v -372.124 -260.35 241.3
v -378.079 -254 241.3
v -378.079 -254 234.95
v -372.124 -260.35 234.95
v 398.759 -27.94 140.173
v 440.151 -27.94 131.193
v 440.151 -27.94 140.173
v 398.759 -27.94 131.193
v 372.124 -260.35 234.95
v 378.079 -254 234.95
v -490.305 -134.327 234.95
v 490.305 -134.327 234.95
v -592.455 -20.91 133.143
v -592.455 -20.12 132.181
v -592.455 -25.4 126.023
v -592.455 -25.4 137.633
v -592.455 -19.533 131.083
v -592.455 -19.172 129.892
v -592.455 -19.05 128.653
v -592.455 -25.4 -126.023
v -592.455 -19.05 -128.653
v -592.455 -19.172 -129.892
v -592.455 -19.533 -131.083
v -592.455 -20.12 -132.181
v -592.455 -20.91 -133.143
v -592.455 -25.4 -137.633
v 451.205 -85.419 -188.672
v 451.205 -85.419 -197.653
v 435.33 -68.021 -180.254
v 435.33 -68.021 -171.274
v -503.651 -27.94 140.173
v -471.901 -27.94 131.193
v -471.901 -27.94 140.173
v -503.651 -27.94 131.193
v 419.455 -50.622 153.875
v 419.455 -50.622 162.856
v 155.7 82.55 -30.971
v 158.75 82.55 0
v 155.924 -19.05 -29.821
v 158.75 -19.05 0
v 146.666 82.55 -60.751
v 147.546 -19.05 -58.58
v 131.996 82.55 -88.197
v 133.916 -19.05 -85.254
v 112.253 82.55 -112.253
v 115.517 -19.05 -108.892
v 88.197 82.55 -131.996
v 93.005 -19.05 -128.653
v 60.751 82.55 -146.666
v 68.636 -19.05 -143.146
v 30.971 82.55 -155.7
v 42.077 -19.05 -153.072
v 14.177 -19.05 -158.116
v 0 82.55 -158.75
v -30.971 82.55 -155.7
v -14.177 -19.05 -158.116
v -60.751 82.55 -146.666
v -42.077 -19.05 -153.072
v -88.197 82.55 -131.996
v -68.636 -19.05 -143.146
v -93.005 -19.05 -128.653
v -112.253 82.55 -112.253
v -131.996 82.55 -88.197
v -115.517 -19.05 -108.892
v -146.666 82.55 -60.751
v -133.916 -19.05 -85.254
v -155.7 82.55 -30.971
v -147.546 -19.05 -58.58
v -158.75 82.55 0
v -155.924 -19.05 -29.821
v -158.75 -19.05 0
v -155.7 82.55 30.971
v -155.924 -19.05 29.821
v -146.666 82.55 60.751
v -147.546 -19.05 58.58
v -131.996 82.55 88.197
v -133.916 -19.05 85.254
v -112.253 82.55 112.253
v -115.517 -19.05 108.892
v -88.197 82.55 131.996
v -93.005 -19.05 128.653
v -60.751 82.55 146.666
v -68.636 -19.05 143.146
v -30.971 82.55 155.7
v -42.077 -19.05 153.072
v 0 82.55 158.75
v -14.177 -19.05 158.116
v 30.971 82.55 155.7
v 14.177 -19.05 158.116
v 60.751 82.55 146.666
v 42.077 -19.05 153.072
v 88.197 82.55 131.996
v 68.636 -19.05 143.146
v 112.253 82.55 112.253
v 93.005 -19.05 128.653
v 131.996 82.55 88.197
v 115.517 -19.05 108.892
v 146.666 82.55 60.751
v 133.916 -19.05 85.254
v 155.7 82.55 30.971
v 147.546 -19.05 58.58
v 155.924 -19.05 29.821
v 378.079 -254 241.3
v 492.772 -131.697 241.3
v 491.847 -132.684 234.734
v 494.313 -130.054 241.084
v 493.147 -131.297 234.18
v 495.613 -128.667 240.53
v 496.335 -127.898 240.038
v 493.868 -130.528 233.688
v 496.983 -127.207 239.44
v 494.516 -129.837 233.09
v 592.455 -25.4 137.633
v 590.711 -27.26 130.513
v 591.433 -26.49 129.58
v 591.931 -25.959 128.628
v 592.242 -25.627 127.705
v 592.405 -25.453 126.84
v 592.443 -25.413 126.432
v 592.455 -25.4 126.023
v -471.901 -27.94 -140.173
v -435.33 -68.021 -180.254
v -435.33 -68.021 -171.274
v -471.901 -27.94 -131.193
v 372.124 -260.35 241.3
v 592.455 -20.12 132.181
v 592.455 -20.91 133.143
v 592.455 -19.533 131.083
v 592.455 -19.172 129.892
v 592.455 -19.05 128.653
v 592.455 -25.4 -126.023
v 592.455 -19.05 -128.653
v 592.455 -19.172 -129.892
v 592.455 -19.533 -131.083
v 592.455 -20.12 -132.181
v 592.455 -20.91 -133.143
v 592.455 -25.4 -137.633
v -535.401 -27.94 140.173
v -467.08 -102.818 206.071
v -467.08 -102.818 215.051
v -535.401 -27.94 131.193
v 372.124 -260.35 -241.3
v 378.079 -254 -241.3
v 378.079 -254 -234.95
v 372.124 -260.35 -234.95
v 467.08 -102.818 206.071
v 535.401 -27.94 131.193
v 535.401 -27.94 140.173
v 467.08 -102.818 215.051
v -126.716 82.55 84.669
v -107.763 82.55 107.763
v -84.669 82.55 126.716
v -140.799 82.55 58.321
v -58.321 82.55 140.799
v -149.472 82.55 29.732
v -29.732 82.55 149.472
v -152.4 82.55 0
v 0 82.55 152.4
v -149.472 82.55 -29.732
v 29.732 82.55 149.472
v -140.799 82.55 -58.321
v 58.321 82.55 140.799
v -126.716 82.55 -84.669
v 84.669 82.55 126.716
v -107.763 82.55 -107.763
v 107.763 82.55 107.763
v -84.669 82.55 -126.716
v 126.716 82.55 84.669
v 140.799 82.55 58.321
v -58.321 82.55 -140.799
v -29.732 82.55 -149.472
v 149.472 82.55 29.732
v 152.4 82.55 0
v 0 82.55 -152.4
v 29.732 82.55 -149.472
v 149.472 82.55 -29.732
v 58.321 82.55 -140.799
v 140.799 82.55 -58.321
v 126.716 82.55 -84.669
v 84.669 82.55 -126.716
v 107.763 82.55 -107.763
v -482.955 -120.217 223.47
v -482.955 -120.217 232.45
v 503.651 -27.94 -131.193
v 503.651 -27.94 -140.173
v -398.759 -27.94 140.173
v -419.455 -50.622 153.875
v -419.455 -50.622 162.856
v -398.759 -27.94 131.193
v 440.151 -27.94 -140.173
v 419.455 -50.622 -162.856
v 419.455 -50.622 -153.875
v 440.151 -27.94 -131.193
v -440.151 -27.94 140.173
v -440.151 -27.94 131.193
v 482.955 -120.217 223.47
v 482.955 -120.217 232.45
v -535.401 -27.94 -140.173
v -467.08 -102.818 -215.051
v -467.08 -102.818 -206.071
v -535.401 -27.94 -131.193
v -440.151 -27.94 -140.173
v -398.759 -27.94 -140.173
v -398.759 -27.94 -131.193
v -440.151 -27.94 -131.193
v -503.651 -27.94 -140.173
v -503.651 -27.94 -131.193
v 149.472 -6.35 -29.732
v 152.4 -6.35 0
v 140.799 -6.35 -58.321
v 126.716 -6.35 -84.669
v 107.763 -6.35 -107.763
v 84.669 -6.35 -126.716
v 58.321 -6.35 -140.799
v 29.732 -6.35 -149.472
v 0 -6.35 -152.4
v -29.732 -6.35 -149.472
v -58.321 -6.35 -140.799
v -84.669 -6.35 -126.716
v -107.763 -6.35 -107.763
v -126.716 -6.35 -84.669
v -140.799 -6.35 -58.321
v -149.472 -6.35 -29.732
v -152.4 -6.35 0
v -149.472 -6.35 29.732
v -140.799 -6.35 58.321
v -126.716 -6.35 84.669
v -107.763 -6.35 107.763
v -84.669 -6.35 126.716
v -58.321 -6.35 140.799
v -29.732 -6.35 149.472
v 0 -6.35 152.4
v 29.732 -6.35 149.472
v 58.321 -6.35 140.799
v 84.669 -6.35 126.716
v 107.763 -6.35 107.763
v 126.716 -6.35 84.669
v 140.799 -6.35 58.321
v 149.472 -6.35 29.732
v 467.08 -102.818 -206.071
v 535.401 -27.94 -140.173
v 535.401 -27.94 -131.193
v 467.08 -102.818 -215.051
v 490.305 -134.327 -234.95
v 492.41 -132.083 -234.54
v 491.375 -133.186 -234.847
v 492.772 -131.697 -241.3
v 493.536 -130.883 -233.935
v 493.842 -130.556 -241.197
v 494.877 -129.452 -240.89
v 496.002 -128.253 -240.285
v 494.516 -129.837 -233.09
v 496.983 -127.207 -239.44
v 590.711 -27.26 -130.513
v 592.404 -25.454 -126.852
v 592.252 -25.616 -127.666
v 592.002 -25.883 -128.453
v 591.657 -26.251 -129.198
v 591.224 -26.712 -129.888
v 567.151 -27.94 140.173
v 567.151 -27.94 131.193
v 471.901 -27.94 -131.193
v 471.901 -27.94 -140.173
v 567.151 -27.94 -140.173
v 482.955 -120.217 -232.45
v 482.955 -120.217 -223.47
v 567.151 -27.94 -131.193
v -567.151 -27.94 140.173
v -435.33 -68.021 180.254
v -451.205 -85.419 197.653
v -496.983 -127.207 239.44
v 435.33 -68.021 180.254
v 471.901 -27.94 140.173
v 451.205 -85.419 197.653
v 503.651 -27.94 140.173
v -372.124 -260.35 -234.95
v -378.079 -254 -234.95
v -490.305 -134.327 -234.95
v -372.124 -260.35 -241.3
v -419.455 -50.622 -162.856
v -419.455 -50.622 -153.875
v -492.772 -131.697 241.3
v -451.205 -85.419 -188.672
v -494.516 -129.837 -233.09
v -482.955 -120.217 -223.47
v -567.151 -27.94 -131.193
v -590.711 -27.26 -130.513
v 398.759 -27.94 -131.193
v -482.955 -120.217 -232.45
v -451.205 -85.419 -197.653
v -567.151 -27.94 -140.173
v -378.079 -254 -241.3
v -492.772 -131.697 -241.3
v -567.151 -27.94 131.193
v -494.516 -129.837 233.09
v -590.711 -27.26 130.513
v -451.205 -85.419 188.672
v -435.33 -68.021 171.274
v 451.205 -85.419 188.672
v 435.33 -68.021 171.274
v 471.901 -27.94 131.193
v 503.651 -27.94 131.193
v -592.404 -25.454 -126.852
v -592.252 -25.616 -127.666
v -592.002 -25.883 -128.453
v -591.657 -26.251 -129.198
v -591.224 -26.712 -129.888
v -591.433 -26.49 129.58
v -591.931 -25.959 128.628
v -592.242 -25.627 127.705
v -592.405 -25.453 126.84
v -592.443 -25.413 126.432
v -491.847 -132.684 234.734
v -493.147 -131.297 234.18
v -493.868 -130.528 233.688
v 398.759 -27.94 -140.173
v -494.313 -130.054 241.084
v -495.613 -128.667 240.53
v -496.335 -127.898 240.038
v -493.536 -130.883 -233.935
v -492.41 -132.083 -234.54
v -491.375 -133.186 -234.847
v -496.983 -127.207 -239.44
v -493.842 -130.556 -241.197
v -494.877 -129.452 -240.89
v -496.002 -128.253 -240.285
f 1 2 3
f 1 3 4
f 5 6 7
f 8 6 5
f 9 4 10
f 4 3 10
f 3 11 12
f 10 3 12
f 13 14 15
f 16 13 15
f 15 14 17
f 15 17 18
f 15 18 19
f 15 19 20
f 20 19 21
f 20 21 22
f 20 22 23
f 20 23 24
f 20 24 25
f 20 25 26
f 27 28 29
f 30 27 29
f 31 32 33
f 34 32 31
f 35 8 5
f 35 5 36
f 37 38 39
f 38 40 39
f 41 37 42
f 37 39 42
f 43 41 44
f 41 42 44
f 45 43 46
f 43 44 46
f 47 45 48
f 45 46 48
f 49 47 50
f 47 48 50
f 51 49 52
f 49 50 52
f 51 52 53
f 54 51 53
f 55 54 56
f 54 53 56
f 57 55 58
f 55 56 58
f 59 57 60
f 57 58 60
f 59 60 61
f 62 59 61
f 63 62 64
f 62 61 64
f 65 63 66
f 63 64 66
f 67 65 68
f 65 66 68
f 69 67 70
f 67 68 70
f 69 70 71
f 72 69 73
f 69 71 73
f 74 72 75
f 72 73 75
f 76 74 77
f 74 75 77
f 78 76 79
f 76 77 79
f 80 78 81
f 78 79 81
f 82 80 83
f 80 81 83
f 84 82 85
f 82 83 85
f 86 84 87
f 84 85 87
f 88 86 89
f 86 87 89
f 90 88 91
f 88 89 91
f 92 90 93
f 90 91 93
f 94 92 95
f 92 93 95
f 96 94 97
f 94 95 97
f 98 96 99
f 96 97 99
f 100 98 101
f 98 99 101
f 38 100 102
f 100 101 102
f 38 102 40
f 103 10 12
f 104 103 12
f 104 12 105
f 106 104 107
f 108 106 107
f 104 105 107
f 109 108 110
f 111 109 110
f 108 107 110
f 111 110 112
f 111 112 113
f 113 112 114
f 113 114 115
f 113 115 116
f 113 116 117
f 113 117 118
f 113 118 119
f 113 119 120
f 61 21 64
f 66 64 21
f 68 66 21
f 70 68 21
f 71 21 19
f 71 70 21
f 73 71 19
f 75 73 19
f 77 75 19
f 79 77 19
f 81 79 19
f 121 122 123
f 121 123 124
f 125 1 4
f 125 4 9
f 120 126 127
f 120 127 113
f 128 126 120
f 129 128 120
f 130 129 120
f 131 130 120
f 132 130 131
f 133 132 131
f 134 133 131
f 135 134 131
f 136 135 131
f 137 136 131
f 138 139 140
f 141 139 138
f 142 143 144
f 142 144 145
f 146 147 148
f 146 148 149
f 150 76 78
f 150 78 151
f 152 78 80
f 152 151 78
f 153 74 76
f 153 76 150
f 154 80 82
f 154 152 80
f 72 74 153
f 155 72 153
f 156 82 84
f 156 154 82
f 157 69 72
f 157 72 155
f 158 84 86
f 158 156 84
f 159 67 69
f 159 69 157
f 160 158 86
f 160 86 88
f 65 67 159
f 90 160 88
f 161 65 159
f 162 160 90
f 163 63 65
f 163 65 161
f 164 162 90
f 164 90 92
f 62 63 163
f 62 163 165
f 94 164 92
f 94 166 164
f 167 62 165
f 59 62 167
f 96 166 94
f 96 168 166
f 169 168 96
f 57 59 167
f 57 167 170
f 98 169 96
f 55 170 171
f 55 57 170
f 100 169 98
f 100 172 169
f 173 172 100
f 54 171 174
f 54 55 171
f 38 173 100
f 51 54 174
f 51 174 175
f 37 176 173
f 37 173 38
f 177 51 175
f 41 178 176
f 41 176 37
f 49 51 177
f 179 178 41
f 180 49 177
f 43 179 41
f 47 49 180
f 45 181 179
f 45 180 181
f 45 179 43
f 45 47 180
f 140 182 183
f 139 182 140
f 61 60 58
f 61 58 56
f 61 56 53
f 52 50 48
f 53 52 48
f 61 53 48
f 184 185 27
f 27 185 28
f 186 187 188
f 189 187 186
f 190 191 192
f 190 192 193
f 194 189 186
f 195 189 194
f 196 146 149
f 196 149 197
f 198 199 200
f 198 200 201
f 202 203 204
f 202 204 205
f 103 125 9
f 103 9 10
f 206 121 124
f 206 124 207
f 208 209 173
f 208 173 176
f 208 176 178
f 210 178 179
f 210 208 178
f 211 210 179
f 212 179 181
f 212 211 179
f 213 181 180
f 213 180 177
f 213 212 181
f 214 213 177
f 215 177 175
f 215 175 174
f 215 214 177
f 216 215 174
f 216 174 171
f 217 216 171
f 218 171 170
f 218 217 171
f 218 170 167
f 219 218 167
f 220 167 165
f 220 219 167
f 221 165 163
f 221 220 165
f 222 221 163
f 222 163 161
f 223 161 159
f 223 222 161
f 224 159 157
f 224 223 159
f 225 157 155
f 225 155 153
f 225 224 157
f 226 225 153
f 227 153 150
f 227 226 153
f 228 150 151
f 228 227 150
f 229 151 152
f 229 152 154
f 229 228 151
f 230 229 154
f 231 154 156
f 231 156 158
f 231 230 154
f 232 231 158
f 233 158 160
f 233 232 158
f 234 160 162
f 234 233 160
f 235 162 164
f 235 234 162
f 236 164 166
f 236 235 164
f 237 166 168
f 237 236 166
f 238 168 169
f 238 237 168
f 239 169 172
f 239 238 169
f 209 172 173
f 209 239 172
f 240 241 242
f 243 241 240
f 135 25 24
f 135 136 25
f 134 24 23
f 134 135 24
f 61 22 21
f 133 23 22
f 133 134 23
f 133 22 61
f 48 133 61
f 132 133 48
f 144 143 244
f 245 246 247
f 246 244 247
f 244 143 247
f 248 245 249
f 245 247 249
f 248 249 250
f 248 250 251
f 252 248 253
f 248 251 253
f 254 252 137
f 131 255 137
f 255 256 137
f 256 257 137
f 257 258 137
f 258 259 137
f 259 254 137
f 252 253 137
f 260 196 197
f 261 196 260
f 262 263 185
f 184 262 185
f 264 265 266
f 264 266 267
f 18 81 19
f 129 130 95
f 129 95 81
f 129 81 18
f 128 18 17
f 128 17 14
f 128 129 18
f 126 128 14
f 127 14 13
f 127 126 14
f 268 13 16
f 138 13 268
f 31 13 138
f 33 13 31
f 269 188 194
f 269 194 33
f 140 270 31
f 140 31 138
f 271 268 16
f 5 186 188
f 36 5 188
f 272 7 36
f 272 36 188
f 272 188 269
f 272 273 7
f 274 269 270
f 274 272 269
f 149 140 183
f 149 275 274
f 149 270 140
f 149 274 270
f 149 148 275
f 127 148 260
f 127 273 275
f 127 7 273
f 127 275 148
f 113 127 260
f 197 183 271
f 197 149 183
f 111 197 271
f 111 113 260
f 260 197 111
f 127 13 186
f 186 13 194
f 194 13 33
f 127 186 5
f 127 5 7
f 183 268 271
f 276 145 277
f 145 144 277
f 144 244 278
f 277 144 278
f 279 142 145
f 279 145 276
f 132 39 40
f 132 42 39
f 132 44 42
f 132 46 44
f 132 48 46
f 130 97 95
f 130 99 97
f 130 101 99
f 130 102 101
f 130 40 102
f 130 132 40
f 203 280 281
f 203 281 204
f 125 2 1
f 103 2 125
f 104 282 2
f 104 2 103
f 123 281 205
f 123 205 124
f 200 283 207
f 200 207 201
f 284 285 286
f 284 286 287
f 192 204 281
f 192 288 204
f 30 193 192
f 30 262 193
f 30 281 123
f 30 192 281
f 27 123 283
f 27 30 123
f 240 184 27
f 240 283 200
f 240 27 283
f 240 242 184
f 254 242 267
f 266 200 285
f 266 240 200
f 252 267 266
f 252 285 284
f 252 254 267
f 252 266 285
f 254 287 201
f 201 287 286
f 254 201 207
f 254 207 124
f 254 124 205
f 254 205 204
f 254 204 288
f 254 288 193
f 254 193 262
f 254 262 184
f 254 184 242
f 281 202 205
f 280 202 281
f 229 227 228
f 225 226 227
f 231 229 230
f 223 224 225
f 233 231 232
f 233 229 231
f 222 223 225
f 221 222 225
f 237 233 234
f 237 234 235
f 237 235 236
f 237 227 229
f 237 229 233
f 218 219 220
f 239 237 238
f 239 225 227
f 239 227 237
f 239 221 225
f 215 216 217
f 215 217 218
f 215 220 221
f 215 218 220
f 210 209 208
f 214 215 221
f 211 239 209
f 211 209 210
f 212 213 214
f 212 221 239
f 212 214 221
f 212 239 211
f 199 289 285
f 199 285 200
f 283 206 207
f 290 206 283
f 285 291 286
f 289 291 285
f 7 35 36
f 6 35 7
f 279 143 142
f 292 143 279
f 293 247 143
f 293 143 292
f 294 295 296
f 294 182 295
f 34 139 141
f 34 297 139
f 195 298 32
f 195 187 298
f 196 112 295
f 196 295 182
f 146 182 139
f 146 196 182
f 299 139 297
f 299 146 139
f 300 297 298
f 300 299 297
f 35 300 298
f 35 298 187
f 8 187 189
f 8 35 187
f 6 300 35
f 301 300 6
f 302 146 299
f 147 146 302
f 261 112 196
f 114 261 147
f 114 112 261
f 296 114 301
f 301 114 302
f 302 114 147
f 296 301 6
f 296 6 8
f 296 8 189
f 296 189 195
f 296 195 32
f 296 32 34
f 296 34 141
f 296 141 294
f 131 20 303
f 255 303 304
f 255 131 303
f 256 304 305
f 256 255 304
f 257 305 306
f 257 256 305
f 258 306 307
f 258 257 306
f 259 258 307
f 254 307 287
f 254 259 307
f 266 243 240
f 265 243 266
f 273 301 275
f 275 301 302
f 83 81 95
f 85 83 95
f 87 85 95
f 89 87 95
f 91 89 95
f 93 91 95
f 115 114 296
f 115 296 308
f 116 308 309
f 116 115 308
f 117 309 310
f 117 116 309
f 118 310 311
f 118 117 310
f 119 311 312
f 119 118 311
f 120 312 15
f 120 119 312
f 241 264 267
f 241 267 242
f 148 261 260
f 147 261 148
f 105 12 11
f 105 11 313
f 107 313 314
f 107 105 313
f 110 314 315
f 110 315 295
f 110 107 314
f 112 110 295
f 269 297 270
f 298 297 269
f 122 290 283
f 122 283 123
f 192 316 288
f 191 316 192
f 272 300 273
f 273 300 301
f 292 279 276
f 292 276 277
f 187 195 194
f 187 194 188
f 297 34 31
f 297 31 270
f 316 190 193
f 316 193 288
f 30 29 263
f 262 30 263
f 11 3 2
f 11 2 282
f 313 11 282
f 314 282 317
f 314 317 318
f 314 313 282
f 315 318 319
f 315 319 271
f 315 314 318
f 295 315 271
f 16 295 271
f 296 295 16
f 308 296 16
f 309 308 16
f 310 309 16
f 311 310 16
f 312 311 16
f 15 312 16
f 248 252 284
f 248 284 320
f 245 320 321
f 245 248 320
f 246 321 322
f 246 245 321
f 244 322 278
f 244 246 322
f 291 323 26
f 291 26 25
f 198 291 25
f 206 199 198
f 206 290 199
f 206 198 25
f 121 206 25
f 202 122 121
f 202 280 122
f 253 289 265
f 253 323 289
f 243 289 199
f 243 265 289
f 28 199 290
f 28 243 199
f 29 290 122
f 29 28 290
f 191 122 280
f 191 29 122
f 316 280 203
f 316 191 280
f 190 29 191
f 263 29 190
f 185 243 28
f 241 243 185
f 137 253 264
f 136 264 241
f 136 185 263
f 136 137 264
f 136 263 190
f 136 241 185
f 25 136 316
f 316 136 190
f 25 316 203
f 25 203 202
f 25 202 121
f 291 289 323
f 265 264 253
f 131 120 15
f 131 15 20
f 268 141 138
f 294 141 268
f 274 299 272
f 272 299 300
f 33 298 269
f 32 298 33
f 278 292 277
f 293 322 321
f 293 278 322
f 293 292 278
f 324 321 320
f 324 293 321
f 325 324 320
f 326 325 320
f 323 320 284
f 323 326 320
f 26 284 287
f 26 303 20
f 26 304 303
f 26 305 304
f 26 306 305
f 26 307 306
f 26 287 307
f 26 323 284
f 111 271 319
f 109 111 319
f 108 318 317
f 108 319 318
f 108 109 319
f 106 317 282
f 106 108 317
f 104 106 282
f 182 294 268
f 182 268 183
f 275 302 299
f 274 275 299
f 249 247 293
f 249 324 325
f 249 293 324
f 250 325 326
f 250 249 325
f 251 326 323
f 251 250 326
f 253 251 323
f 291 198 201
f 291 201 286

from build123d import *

# Parameters (mm, degrees)
BOSS_EXTRUDE1_DEPTH = 592.455
CUT_EXTRUDE1_DEPTH  = 482.6
BOSS_EXTRUDE2_DEPTH = 6.35
BOSS_EXTRUDE3_DEPTH = 6.35
SKETCH5_R           = 158.75
BOSS_EXTRUDE4_DEPTH = 12.7
SKETCH6_R           = 158.75
SKETCH6_R_2         = 152.4
BOSS_EXTRUDE5_DEPTH = 88.9


with BuildPart() as part:
    # Sketch1 → Boss-Extrude1 (new body, symmetric)
    with BuildSketch(Plane(origin=(0, 0, 0), x_dir=(0, 0, -1), z_dir=(1, 0, 0))):
        with BuildLine():
            Line((128.652963539, -19.049996224), (-128.652963539, -19.049996224))
            ThreePointArc((-128.652963539, -19.049996224), (-131.083003335, -19.533361193), (-133.1430916, -20.909868164))
            Line((-133.1430916, -20.909868164), (-239.440128061, -127.206904624))
            ThreePointArc((-239.440128061, -127.206904624), (-240.816635031, -129.266992889), (-241.3, -131.697032685))
            Line((-241.3, -131.697032685), (-241.3, -253.999996224))
            Line((-241.3, -253.999996224), (-234.95, -253.999996224))
            Line((-234.95, -253.999996224), (-234.95, -134.327288806))
            ThreePointArc((-234.95, -134.327288806), (-234.466635031, -131.89724901), (-233.090128061, -129.837160745))
            Line((-233.090128061, -129.837160745), (-130.512835479, -27.259868164))
            ThreePointArc((-130.512835479, -27.259868164), (-128.452747214, -25.883361193), (-126.022707418, -25.399996224))
            Line((-126.022707418, -25.399996224), (126.022707418, -25.399996224))
            ThreePointArc((126.022707418, -25.399996224), (128.452747214, -25.883361193), (130.512835479, -27.259868164))
            Line((130.512835479, -27.259868164), (233.090128061, -129.837160745))
            ThreePointArc((233.090128061, -129.837160745), (234.466635031, -131.89724901), (234.95, -134.327288806))
            Line((234.95, -134.327288806), (234.95, -253.999996224))
            Line((234.95, -253.999996224), (241.3, -253.999996224))
            Line((241.3, -253.999996224), (241.3, -131.697032685))
            ThreePointArc((241.3, -131.697032685), (240.816635031, -129.266992889), (239.440128061, -127.206904624))
            Line((239.440128061, -127.206904624), (133.1430916, -20.909868164))
            ThreePointArc((133.1430916, -20.909868164), (131.083003335, -19.533361193), (128.652963539, -19.049996224))
        make_face()
    extrude(amount=BOSS_EXTRUDE1_DEPTH, both=True)

    # Sketch2 → Cut-Extrude1 (cut)
    with BuildSketch(Plane(origin=(0, 0, -241.3), x_dir=(-1, 0, 0), z_dir=(0, 0, -1))):
        Polygon((-592.455, -253.999996224), (-378.079, -253.999996224), (-592.455, -25.399996224), align=None)
        Polygon((-535.401348451, -27.939996224), (-467.080186427, -102.818047021), (-482.955186427, -120.216595599), (-567.151348451, -27.939996224), align=None)
        Polygon((-398.759024402, -27.939996224), (-419.455186427, -50.622401287), (-440.151348451, -27.939996224), align=None)
        Polygon((-503.651348451, -27.939996224), (-451.205186427, -85.419498443), (-435.330186427, -68.020949865), (-471.901348451, -27.939996224), align=None)
        Polygon((398.759024402, -27.939996224), (440.151348451, -27.939996224), (419.455186427, -50.622401287), align=None)
        Polygon((471.901348451, -27.939996224), (503.651348451, -27.939996224), (451.205186427, -85.419498443), (435.330186427, -68.020949865), align=None)
        Polygon((535.401348451, -27.939996224), (567.151348451, -27.939996224), (482.955186427, -120.216595599), (467.080186427, -102.818047021), align=None)
        Polygon((592.455, -25.399996224), (592.455, -253.999996224), (378.079, -253.999996224), align=None)
    extrude(amount=-CUT_EXTRUDE1_DEPTH, mode=Mode.SUBTRACT)

    # Sketch3 → Boss-Extrude2 (add)
    with BuildSketch(Plane(origin=(0, 0, -241.3), x_dir=(-1, 0, 0), z_dir=(0, 0, -1))):
        Polygon((-372.124111111, -260.349996224), (372.124111111, -260.349996224), (378.079, -253.999996224), (-378.079, -253.999996224), align=None)
    extrude(amount=-BOSS_EXTRUDE2_DEPTH)

    # Sketch4 → Boss-Extrude3 (add)
    with BuildSketch(Plane.XY.offset(241.3)):
        Polygon((-372.124111111, -260.349996224), (372.124111111, -260.349996224), (378.079, -253.999996224), (-378.079, -253.999996224), align=None)
    extrude(amount=-BOSS_EXTRUDE3_DEPTH)

    # Sketch5 → Boss-Extrude4 (add)
    with BuildSketch(Plane(origin=(0, -19.049996224, 0), x_dir=(1, 0, 0), z_dir=(0, 1, 0))):
        Circle(SKETCH5_R)
    extrude(amount=BOSS_EXTRUDE4_DEPTH)

    # Sketch6 → Boss-Extrude5 (add)
    with BuildSketch(Plane(origin=(0, -6.349996224, 0), x_dir=(1, 0, 0), z_dir=(0, 1, 0))):
        Circle(SKETCH6_R)
        Circle(SKETCH6_R_2, mode=Mode.SUBTRACT)
    extrude(amount=BOSS_EXTRUDE5_DEPTH)


solid = part.part
